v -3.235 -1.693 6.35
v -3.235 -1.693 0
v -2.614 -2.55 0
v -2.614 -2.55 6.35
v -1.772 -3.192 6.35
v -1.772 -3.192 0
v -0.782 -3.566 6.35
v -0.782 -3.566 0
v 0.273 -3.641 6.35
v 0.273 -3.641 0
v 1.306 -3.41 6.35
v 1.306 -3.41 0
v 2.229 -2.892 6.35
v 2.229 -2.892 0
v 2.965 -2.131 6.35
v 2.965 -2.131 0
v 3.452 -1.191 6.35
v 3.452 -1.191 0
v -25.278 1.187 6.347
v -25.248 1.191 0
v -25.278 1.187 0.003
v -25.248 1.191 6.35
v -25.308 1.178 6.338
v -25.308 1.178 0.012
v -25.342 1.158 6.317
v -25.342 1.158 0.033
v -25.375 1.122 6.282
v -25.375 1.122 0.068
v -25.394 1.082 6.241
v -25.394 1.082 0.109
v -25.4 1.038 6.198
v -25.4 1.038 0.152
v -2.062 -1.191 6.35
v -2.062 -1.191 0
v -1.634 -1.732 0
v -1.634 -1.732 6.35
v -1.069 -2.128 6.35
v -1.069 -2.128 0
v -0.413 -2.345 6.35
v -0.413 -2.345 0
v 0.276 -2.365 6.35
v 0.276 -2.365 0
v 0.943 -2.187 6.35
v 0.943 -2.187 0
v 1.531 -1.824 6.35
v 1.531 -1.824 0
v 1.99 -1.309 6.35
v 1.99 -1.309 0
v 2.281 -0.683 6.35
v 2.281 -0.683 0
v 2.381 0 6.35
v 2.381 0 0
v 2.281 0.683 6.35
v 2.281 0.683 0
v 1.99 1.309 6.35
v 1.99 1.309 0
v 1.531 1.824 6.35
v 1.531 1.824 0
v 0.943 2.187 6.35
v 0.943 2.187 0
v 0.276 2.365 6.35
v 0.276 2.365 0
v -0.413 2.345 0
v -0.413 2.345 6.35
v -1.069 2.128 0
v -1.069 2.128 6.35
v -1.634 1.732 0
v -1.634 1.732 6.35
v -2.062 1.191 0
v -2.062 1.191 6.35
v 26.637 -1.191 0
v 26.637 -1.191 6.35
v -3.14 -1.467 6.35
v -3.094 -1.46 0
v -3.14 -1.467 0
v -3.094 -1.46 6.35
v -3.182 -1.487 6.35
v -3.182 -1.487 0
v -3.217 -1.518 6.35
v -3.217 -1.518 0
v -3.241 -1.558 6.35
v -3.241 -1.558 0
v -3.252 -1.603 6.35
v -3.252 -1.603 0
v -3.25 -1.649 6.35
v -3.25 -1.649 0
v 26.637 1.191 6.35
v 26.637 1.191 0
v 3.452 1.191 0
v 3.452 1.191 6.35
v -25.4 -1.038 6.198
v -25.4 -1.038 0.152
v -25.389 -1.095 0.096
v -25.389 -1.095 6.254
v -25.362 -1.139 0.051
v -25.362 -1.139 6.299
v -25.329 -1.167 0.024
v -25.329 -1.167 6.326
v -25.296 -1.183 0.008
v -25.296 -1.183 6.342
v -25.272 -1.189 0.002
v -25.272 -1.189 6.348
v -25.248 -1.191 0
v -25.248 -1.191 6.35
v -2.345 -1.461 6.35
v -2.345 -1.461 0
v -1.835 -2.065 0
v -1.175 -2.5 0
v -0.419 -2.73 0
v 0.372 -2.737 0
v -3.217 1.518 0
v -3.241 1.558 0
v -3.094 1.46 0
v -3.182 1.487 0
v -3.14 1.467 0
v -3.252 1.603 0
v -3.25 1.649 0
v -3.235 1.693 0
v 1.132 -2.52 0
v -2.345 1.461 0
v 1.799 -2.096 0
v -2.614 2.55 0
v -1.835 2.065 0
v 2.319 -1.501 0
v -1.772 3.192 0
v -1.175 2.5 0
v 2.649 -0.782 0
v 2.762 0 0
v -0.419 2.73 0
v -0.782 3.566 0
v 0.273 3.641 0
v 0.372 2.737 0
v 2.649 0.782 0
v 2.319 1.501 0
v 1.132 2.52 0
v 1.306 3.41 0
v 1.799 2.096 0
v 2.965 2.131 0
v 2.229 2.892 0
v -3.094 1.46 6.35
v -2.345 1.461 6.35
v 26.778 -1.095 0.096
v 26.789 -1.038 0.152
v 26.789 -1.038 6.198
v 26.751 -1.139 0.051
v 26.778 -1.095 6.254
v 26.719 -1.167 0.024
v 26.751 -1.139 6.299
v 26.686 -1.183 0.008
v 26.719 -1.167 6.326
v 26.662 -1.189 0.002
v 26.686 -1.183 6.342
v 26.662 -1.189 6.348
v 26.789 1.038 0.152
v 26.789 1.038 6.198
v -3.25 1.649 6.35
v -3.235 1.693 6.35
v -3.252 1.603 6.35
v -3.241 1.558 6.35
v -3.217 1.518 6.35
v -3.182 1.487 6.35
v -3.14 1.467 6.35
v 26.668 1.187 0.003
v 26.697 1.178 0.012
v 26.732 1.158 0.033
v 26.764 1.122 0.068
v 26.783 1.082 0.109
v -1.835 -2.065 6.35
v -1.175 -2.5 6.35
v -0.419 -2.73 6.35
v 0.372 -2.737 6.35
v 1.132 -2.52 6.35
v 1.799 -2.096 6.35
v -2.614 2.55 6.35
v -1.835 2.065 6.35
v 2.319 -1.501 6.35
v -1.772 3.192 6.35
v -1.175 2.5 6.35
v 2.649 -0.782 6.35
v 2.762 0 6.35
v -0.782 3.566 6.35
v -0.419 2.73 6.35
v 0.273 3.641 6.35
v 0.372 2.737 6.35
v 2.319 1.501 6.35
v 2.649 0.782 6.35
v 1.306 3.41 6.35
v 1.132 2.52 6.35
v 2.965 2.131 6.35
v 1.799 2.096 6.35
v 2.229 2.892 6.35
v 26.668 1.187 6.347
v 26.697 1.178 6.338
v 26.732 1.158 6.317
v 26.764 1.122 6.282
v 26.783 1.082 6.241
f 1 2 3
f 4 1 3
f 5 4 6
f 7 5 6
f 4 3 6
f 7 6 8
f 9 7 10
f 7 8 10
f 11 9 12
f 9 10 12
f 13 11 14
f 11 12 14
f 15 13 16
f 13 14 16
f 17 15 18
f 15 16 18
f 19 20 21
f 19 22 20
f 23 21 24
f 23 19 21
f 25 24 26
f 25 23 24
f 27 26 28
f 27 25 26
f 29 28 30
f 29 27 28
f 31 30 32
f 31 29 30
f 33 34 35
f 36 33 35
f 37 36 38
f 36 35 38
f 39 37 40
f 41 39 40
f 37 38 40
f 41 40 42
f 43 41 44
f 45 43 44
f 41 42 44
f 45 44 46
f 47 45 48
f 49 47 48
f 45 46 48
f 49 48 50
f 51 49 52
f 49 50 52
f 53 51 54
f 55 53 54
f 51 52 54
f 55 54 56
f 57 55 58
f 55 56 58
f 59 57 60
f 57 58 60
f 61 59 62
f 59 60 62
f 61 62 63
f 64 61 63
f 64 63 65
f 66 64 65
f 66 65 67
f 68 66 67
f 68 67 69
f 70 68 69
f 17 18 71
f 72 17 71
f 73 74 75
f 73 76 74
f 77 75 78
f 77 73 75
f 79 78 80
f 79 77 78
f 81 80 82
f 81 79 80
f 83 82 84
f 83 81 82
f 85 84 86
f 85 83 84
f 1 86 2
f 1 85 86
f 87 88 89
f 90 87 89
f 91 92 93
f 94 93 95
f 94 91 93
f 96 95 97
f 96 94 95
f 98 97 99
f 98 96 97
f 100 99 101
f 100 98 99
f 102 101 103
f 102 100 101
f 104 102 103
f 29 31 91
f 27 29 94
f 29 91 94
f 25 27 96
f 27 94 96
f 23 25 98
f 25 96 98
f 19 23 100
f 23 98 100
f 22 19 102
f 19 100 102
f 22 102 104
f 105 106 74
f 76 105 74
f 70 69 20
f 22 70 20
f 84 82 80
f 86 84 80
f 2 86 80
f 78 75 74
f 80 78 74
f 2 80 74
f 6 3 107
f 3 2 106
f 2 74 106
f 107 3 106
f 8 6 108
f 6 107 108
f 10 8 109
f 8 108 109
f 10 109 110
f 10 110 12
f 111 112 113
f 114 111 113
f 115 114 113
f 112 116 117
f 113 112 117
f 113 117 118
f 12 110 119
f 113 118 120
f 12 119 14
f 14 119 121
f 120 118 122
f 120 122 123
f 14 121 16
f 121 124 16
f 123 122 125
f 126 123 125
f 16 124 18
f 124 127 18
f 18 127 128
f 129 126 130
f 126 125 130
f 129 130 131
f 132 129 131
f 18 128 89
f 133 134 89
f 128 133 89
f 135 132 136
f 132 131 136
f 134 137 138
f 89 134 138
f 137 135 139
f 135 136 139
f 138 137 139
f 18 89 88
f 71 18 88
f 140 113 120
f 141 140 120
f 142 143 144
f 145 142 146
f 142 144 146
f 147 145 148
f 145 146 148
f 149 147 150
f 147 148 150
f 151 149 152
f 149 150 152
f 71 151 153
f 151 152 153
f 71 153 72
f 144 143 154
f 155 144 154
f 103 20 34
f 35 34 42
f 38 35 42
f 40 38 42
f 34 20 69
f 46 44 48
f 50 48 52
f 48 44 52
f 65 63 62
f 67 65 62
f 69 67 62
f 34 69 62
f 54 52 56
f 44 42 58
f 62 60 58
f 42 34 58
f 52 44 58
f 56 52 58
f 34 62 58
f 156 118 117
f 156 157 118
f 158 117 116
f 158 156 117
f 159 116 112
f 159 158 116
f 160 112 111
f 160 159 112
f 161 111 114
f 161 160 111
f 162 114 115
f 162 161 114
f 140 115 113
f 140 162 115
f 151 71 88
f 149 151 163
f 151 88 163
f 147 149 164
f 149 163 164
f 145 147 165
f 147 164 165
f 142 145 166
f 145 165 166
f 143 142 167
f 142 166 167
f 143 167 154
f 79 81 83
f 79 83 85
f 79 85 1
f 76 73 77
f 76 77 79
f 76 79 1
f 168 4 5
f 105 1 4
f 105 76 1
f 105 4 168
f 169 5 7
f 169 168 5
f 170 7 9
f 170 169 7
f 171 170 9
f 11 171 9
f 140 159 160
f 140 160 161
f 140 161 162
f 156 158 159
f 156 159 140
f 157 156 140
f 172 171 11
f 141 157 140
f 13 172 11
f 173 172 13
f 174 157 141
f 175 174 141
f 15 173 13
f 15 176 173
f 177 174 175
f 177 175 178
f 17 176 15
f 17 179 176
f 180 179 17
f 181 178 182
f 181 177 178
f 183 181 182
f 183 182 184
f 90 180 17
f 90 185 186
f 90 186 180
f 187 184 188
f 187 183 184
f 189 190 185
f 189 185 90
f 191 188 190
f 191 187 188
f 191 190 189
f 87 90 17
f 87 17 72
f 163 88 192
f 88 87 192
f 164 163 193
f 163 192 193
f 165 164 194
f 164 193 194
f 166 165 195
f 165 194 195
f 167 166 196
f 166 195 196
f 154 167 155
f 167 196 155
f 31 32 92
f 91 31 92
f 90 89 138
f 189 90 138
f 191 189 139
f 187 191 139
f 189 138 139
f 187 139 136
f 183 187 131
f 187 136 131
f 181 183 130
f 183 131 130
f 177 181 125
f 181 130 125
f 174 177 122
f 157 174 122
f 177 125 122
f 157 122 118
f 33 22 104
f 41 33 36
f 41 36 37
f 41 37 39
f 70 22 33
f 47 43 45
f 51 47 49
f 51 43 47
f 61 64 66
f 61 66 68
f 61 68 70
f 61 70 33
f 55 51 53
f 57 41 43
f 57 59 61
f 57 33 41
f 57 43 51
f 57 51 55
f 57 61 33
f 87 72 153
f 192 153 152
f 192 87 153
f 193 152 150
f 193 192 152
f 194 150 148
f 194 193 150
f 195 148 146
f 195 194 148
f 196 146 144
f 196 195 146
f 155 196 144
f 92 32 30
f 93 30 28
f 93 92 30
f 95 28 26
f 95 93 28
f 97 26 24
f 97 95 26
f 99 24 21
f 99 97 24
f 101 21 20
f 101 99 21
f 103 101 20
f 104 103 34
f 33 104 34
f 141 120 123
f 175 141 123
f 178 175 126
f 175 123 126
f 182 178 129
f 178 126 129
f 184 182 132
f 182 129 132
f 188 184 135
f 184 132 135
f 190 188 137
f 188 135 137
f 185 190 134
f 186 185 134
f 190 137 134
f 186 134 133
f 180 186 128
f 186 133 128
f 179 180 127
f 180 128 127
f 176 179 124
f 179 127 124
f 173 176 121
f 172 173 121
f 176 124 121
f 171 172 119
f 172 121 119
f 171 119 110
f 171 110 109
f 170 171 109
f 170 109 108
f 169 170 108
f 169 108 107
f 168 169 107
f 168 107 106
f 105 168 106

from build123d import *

# Parameters (mm, degrees)
F1_DEPTH = 6.35
F2_R     = 0.15875
F3_R     = 0.1524


with BuildPart() as f1:
    # F0 (on Top) → F1 (new body)
    with BuildSketch(Plane.XY):
        with BuildLine():
            Line((-2.062223, 1.190625), (-25.4, 1.190625))
            Line((-25.4, 1.190625), (-25.4, -1.190625))
            Line((-25.4, -1.190625), (-2.062223, -1.190625))
            ThreePointArc((-2.062223, -1.190625), (2.38125, 0), (-2.062223, 1.190625))
        make_face()
        with BuildLine():
            Line((26.789449, -1.190625), (26.789449, 1.190625))
            Line((26.789449, 1.190625), (3.451672, 1.190625))
            ThreePointArc((3.451672, 1.190625), (0.144835, 3.648376), (-3.346426, 1.4605))
            Line((-3.346426, 1.4605), (-2.344561, 1.4605))
            ThreePointArc((-2.344561, 1.4605), (2.76225, 0), (-2.344561, -1.4605))
            Line((-2.344561, -1.4605), (-3.346426, -1.4605))
            ThreePointArc((-3.346426, -1.4605), (0.144835, -3.648376), (3.451672, -1.190625))
            Line((3.451672, -1.190625), (26.789449, -1.190625))
        make_face()
    extrude(amount=F1_DEPTH)

    # F2
    f2_edges = [f1.edges().sort_by_distance(p)[0] for p in [
        (-3.346426, 1.4605, 3.175),
        (-3.346426, -1.4605, 3.175),
    ]]
    fillet(f2_edges, radius=F2_R)

    # F3
    f3_edges = [f1.edges().sort_by_distance(p)[0] for p in [
        (-25.4, 1.190625, 3.175),
        (-25.4, -1.190625, 3.175),
        (-25.4, 0, 0),
        (-25.4, 0, 6.35),
        (26.789449, -1.190625, 3.175),
        (26.789449, 1.190625, 3.175),
        (26.789449, 0, 0),
        (26.789449, 0, 6.35),
    ]]
    fillet(f3_edges, radius=F3_R)


solid = f1.part
